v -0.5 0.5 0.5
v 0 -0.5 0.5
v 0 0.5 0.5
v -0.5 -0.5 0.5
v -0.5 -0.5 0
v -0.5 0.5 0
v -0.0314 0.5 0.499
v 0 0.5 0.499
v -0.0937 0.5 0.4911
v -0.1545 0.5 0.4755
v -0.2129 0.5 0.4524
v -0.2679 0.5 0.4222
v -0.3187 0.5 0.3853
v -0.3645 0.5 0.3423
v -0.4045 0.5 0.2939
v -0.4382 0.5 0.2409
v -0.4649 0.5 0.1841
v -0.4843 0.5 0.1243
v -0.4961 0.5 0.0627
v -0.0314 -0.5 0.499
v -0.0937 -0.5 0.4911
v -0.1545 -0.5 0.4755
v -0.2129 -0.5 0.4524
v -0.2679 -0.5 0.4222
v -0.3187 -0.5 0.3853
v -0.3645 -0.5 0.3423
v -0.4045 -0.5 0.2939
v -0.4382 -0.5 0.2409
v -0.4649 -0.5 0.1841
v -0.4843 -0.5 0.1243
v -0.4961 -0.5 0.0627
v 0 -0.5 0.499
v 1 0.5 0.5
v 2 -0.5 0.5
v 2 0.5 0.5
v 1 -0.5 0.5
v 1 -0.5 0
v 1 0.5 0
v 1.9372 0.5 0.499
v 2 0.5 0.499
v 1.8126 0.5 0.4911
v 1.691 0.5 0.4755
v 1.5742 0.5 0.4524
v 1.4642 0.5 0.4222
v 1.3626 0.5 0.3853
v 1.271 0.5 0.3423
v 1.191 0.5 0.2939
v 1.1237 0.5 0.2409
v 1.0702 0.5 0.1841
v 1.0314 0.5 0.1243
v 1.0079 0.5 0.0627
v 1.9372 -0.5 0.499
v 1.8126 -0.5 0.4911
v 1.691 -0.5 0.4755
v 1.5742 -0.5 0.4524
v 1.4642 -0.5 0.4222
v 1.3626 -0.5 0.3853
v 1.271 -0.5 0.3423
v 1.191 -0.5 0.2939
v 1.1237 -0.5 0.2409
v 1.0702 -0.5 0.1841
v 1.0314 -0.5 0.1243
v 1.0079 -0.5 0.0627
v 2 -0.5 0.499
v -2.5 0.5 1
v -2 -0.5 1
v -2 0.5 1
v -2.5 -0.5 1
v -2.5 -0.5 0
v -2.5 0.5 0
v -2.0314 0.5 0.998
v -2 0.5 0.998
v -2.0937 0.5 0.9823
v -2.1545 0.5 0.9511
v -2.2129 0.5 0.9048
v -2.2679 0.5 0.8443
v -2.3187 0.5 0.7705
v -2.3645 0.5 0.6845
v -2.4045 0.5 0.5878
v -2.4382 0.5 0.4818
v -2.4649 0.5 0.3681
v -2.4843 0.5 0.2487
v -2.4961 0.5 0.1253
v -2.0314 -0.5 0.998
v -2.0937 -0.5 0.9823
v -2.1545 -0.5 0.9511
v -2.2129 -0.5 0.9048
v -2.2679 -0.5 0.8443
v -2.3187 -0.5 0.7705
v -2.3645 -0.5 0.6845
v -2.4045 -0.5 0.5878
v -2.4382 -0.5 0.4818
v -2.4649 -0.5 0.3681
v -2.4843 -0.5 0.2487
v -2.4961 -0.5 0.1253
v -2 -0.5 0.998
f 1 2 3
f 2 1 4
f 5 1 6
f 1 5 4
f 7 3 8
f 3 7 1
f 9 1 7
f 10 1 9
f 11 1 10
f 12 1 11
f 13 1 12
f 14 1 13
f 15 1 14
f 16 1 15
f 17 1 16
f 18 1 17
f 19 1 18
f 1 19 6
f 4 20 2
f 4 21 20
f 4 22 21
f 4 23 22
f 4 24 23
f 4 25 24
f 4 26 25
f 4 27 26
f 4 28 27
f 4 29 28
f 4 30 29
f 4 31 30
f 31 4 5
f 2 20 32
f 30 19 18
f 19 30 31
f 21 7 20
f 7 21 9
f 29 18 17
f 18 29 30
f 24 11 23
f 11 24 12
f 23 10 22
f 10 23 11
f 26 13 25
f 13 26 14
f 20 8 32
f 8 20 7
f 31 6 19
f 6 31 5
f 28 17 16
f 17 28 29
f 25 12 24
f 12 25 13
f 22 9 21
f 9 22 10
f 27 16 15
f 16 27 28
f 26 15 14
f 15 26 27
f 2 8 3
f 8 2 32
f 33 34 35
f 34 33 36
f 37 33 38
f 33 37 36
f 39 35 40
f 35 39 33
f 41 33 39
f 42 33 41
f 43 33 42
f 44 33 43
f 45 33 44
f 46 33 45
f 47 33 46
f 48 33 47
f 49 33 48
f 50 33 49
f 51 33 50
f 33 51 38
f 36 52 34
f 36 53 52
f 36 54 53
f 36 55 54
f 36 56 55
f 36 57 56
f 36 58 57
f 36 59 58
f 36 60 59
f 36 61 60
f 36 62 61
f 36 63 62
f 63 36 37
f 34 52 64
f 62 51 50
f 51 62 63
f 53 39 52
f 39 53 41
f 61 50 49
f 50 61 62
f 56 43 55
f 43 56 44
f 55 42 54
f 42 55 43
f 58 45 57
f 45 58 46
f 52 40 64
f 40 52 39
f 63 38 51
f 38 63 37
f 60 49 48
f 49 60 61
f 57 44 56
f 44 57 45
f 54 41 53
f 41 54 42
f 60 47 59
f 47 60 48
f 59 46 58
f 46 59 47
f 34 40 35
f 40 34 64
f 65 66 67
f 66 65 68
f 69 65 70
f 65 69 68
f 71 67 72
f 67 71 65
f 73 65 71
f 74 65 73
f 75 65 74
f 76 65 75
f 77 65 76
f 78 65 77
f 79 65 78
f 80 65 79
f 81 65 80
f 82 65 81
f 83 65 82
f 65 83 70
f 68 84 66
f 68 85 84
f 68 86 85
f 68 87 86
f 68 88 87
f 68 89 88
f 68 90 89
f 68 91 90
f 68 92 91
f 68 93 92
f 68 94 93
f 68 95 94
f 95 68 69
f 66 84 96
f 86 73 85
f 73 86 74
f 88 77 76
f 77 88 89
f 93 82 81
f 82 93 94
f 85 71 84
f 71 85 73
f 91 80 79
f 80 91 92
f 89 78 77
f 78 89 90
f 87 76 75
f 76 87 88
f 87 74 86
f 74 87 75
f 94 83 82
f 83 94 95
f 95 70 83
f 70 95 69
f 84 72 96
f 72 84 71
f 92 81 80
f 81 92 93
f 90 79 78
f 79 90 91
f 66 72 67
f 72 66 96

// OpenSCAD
module make_2d_corner_fillet(width=1, depth=1, height=1, $fn=50){
    difference(){
        cube([width, depth, height], center=true);
        
        scale([1*width, 1, 1*height])
        translate([0,0,0])
        rotate([90,0,0])
        cylinder(d=1, h=depth*2, center=true, $fn=$fn);
        
        translate([width/2,0,0])
        cube([width,depth*2,height*2], center=true);
        
        translate([0,0,-height/2])
        cube([width*2,depth*2,height], center=true);
    }
}

make_2d_corner_fillet();

translate([2,0,0])
make_2d_corner_fillet(width=2);

translate([-2,0,0])
make_2d_corner_fillet(height=2);
